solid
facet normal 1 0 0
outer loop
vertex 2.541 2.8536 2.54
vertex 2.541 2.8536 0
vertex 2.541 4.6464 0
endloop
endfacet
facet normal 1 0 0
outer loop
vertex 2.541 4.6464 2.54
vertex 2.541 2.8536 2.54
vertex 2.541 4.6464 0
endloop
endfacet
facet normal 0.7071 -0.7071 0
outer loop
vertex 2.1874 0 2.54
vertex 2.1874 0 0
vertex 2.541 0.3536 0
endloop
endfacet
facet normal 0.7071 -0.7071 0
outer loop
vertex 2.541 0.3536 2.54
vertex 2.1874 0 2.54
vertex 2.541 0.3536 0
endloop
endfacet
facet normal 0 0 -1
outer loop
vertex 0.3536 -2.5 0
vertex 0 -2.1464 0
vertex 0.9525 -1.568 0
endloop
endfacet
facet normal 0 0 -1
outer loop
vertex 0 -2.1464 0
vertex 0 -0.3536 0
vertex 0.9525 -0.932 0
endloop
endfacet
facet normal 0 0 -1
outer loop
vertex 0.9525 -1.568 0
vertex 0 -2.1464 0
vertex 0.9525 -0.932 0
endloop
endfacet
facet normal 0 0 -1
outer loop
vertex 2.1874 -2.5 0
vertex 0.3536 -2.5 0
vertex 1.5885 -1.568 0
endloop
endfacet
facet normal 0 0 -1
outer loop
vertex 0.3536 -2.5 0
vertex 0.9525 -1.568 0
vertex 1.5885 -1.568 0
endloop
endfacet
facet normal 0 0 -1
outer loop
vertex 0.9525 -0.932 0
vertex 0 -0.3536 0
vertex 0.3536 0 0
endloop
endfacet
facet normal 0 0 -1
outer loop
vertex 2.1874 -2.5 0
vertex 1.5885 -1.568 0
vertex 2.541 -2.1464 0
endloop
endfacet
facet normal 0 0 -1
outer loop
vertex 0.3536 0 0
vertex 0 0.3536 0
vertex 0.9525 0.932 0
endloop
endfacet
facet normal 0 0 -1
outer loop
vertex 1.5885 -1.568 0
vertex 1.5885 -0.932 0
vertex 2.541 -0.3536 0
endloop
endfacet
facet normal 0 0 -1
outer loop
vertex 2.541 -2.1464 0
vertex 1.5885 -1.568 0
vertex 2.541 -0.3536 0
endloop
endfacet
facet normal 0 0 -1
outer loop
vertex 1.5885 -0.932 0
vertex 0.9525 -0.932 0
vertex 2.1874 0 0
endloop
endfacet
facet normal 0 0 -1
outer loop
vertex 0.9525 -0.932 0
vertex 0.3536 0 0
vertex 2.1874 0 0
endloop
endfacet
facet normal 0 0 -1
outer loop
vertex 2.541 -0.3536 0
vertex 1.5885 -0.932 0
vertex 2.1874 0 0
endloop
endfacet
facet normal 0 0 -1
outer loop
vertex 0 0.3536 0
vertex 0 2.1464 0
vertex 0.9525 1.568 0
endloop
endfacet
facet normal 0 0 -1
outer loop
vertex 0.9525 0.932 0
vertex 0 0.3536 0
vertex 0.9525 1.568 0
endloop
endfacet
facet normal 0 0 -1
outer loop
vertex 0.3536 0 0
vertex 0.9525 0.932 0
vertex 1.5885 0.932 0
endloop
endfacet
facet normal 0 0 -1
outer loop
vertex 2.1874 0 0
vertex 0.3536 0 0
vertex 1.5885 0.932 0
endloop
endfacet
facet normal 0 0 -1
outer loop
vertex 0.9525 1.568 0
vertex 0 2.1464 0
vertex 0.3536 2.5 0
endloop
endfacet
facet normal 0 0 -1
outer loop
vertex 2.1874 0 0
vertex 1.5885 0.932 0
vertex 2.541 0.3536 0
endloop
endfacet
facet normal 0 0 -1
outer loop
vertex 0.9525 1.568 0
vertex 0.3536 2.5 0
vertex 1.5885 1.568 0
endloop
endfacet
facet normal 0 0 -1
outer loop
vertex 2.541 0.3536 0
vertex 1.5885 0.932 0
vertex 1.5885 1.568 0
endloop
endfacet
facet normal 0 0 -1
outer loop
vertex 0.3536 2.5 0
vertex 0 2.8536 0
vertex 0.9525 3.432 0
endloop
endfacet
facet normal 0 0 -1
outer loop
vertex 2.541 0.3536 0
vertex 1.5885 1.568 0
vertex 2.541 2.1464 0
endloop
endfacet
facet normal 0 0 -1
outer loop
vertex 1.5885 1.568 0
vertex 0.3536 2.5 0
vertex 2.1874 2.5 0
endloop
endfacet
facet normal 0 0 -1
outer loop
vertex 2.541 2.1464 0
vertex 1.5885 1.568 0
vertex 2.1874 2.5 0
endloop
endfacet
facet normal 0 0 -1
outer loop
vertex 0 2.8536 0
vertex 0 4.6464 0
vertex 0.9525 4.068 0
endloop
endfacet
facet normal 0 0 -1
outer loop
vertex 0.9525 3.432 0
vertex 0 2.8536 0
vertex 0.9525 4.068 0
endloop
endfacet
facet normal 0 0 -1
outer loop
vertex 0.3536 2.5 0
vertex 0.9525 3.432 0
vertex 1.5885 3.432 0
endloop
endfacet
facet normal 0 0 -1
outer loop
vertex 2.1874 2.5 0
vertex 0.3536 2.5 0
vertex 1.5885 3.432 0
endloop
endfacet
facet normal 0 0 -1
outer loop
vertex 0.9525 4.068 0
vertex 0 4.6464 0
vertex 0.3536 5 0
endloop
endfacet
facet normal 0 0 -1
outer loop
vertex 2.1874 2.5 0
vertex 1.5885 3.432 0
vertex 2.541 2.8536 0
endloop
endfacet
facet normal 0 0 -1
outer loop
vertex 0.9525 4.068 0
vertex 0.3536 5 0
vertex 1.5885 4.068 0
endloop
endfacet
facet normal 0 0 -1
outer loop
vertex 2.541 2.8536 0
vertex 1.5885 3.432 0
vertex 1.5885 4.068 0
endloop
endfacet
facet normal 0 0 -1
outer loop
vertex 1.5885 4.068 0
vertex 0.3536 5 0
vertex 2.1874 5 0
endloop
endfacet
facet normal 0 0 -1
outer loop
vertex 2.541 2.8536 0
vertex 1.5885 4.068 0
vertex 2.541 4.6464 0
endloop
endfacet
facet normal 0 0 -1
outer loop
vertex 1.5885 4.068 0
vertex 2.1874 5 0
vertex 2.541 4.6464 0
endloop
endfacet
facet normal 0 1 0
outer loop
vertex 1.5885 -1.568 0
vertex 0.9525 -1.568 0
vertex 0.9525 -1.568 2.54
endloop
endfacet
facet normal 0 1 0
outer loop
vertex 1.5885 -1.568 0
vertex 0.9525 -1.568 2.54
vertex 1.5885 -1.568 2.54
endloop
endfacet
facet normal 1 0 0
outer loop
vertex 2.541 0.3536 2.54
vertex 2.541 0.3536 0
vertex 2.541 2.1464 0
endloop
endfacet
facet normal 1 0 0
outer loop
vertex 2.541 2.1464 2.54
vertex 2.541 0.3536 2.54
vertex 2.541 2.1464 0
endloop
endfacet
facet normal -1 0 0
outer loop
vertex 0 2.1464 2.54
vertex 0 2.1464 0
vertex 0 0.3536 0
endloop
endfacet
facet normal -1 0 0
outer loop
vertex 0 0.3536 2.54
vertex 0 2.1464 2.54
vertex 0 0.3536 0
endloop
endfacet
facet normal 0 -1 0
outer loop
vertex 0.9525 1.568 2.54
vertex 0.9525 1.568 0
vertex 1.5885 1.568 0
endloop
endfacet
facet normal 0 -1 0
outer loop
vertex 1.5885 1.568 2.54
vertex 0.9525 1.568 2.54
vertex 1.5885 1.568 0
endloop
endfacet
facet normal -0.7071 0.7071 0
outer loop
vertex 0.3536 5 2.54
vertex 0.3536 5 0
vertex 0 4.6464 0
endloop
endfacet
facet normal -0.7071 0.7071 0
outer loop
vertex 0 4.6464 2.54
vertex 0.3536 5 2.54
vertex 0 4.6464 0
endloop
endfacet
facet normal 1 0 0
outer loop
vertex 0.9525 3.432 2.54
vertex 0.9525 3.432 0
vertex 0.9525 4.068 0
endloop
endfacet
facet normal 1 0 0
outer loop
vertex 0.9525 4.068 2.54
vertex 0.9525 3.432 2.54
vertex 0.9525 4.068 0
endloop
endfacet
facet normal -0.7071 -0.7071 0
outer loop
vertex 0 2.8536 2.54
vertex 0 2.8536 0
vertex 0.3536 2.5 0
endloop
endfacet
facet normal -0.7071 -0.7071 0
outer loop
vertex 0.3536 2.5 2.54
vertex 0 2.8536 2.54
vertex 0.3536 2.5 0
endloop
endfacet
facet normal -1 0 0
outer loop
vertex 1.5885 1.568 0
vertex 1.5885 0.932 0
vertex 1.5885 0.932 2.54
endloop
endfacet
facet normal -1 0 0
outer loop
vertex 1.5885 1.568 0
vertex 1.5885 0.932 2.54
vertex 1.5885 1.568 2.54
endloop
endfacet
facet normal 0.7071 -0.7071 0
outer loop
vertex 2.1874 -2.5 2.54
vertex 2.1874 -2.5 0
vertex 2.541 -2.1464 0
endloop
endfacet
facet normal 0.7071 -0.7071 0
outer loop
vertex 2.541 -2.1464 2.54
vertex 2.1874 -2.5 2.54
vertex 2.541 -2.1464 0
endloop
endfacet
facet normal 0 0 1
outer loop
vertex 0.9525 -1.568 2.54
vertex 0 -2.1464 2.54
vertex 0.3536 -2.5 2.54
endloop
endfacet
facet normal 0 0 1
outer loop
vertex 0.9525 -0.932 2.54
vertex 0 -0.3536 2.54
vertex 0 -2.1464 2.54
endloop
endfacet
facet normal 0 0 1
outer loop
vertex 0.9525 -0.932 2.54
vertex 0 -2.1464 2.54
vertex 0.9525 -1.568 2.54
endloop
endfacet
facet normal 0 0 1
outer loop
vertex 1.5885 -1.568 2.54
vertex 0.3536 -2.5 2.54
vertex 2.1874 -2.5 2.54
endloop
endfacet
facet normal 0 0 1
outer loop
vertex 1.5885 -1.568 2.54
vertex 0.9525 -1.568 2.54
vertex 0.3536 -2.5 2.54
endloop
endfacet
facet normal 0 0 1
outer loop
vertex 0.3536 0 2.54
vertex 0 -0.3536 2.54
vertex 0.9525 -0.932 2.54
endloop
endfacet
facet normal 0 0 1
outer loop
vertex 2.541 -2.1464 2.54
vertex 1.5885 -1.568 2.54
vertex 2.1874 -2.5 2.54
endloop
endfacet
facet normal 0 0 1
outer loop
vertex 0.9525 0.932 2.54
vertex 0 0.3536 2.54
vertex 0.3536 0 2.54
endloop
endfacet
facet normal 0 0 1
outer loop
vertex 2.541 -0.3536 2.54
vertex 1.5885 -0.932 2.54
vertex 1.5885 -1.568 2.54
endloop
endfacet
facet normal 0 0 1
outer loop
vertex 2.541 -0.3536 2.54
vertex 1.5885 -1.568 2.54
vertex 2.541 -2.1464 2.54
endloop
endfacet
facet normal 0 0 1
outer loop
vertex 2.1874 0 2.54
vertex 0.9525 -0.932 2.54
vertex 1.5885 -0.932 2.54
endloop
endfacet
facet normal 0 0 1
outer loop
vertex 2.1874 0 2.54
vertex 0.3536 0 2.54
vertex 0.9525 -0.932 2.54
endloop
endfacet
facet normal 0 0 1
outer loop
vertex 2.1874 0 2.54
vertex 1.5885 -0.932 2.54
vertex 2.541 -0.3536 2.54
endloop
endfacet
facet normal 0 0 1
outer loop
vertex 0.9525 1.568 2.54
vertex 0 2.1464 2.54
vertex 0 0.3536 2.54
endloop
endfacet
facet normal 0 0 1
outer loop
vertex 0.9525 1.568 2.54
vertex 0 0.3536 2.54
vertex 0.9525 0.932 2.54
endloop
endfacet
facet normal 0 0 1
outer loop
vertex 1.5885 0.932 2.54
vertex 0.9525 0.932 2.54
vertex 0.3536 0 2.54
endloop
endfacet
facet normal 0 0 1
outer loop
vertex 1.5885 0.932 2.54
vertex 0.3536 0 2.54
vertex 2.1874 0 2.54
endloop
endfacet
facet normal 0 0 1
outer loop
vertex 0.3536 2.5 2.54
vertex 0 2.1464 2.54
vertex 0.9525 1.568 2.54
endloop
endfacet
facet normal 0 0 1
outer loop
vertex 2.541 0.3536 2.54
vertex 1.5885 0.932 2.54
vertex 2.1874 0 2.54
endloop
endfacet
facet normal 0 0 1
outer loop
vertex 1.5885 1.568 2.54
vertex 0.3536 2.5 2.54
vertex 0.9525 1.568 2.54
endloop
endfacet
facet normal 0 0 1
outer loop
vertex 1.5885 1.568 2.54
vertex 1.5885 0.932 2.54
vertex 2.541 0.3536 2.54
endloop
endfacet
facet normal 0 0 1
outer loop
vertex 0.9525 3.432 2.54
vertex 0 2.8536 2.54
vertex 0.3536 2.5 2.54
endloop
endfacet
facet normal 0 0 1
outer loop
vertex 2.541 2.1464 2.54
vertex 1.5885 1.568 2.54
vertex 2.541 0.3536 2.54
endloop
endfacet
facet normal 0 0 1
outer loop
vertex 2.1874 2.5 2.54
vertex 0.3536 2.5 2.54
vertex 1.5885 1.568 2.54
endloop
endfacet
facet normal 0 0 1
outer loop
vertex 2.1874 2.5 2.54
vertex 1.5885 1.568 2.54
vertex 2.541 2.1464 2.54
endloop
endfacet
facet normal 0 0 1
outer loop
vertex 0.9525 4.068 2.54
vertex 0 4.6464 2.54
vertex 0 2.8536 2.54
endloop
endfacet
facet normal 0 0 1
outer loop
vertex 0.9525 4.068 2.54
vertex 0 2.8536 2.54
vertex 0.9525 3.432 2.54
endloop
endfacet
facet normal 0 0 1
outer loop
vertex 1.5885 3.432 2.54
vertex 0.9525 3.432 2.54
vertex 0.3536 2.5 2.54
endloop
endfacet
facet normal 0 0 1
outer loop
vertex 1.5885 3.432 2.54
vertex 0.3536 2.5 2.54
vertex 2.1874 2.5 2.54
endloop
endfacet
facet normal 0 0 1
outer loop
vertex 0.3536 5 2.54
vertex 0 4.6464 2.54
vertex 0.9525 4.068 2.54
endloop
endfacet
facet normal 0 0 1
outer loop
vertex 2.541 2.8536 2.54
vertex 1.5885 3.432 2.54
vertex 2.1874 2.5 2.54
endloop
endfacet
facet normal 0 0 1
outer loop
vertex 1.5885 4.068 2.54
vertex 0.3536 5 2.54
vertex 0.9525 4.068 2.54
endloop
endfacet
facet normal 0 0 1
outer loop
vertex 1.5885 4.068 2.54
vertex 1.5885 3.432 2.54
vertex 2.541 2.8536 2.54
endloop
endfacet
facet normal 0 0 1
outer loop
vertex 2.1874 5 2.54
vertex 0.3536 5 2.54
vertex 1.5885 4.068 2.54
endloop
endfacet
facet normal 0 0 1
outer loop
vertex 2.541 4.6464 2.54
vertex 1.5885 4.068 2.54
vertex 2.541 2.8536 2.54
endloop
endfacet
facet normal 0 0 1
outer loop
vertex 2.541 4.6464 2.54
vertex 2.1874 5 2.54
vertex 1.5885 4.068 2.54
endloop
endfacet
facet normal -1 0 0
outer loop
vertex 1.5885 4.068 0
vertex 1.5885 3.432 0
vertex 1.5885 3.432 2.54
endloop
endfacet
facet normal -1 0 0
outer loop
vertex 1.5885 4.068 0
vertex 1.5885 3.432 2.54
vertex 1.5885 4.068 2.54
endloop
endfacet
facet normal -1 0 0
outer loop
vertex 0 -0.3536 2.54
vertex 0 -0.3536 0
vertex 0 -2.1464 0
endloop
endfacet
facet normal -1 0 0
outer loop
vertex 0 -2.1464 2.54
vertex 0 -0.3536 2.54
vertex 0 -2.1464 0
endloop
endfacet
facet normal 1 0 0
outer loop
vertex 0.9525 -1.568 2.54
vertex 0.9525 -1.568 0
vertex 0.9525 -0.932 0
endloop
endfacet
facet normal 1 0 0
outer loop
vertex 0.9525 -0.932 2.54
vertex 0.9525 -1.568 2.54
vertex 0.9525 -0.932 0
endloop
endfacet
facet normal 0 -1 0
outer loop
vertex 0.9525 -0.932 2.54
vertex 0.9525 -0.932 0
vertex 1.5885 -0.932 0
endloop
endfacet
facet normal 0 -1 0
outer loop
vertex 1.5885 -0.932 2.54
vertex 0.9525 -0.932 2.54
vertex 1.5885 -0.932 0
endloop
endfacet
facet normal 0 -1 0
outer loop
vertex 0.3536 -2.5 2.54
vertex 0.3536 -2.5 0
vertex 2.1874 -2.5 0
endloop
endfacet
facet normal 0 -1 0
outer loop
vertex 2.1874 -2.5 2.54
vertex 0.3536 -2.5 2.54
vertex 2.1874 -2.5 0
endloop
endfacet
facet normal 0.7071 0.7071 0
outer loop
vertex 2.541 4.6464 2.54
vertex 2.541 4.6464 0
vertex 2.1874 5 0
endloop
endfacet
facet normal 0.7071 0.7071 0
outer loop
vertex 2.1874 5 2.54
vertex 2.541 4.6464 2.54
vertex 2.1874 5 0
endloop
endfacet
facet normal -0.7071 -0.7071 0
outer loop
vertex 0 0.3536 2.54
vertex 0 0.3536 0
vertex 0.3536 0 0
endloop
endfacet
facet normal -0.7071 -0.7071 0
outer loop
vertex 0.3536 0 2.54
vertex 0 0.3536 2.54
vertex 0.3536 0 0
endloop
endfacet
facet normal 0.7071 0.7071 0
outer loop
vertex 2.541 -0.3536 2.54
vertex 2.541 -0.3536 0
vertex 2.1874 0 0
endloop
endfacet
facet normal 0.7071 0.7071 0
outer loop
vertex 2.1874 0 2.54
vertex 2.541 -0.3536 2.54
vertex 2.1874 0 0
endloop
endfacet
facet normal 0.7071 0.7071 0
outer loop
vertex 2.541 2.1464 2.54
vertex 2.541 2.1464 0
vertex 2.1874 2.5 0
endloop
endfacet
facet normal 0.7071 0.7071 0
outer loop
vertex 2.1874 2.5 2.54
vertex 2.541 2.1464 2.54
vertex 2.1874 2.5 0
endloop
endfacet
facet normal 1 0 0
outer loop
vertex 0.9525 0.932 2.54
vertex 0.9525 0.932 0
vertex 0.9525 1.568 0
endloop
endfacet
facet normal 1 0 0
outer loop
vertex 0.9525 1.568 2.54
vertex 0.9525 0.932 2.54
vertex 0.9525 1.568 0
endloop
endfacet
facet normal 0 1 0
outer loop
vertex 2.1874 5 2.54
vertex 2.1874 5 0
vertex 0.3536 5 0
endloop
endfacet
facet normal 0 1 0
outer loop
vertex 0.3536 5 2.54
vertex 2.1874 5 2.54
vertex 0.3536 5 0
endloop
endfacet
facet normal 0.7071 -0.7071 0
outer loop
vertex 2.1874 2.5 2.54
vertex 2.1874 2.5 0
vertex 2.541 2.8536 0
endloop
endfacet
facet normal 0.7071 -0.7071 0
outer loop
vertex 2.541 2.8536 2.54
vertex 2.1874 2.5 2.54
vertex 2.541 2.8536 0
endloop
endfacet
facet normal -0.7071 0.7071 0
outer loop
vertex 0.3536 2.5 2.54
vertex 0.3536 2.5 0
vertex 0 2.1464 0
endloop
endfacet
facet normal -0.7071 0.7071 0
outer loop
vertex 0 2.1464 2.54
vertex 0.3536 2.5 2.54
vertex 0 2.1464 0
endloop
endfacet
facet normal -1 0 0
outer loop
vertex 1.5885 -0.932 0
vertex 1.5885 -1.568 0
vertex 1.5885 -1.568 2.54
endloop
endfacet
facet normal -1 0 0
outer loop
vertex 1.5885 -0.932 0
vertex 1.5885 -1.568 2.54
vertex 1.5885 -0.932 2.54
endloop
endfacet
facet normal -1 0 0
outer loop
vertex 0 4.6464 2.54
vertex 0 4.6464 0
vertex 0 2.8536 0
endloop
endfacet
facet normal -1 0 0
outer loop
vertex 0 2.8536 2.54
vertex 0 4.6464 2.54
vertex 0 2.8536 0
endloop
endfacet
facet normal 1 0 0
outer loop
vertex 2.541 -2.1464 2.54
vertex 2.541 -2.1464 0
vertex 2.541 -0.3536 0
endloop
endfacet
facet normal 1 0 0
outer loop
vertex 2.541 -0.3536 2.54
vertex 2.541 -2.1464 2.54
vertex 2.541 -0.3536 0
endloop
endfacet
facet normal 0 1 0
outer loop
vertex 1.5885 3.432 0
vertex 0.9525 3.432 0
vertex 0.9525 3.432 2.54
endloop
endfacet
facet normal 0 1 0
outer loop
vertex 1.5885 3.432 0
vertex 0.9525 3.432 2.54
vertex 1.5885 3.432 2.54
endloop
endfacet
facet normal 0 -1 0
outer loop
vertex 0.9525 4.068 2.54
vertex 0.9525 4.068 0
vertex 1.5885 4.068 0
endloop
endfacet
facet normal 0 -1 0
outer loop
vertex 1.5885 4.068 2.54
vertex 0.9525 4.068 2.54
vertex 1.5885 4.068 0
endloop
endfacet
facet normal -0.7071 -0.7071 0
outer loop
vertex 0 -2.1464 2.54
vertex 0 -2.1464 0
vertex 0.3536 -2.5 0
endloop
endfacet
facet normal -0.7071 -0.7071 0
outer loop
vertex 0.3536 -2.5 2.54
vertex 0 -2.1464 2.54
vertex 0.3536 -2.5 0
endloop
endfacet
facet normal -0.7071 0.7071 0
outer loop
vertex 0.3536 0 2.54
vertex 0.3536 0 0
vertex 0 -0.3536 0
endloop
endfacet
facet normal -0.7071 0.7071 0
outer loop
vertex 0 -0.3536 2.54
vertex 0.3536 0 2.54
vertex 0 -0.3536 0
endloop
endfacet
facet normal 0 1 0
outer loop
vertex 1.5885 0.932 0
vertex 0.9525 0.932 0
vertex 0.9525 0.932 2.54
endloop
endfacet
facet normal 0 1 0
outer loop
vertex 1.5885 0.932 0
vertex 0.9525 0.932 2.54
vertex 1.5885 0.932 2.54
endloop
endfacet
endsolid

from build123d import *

# Parameters (mm, degrees)
PIN_DRAWING_W       = 0.636
PIN_DRAWING_H       = 0.636
BOSS_EXTRUDE1_DEPTH = 2.54


with BuildPart() as part:
    # pin_drawing → Boss-Extrude1 (new body)
    with BuildSketch(Plane.XY):
        Polygon((0, 2.146446609), (0, 0.353553391), (0.353553391, 0), (0, -0.353553391), (0, -2.146446609), (0.353553391, -2.5), (2.187446609, -2.5), (2.541, -2.146446609), (2.541, -0.353553391), (2.187446609, 0), (2.541, 0.353553391), (2.541, 2.146446609), (2.187446609, 2.5), (2.541, 2.853553391), (2.541, 4.646446609), (2.187446609, 5), (0.353553391, 5), (0, 4.646446609), (0, 2.853553391), (0.353553391, 2.5), align=None)
        with Locations((1.2705, -1.25)):
            Rectangle(PIN_DRAWING_W, PIN_DRAWING_H, mode=Mode.SUBTRACT)
        with Locations((1.2705, 1.25)):
            Rectangle(PIN_DRAWING_W, PIN_DRAWING_H, mode=Mode.SUBTRACT)
        with Locations((1.2705, 3.75)):
            Rectangle(PIN_DRAWING_W, PIN_DRAWING_H, mode=Mode.SUBTRACT)
    extrude(amount=BOSS_EXTRUDE1_DEPTH)


solid = part.part
